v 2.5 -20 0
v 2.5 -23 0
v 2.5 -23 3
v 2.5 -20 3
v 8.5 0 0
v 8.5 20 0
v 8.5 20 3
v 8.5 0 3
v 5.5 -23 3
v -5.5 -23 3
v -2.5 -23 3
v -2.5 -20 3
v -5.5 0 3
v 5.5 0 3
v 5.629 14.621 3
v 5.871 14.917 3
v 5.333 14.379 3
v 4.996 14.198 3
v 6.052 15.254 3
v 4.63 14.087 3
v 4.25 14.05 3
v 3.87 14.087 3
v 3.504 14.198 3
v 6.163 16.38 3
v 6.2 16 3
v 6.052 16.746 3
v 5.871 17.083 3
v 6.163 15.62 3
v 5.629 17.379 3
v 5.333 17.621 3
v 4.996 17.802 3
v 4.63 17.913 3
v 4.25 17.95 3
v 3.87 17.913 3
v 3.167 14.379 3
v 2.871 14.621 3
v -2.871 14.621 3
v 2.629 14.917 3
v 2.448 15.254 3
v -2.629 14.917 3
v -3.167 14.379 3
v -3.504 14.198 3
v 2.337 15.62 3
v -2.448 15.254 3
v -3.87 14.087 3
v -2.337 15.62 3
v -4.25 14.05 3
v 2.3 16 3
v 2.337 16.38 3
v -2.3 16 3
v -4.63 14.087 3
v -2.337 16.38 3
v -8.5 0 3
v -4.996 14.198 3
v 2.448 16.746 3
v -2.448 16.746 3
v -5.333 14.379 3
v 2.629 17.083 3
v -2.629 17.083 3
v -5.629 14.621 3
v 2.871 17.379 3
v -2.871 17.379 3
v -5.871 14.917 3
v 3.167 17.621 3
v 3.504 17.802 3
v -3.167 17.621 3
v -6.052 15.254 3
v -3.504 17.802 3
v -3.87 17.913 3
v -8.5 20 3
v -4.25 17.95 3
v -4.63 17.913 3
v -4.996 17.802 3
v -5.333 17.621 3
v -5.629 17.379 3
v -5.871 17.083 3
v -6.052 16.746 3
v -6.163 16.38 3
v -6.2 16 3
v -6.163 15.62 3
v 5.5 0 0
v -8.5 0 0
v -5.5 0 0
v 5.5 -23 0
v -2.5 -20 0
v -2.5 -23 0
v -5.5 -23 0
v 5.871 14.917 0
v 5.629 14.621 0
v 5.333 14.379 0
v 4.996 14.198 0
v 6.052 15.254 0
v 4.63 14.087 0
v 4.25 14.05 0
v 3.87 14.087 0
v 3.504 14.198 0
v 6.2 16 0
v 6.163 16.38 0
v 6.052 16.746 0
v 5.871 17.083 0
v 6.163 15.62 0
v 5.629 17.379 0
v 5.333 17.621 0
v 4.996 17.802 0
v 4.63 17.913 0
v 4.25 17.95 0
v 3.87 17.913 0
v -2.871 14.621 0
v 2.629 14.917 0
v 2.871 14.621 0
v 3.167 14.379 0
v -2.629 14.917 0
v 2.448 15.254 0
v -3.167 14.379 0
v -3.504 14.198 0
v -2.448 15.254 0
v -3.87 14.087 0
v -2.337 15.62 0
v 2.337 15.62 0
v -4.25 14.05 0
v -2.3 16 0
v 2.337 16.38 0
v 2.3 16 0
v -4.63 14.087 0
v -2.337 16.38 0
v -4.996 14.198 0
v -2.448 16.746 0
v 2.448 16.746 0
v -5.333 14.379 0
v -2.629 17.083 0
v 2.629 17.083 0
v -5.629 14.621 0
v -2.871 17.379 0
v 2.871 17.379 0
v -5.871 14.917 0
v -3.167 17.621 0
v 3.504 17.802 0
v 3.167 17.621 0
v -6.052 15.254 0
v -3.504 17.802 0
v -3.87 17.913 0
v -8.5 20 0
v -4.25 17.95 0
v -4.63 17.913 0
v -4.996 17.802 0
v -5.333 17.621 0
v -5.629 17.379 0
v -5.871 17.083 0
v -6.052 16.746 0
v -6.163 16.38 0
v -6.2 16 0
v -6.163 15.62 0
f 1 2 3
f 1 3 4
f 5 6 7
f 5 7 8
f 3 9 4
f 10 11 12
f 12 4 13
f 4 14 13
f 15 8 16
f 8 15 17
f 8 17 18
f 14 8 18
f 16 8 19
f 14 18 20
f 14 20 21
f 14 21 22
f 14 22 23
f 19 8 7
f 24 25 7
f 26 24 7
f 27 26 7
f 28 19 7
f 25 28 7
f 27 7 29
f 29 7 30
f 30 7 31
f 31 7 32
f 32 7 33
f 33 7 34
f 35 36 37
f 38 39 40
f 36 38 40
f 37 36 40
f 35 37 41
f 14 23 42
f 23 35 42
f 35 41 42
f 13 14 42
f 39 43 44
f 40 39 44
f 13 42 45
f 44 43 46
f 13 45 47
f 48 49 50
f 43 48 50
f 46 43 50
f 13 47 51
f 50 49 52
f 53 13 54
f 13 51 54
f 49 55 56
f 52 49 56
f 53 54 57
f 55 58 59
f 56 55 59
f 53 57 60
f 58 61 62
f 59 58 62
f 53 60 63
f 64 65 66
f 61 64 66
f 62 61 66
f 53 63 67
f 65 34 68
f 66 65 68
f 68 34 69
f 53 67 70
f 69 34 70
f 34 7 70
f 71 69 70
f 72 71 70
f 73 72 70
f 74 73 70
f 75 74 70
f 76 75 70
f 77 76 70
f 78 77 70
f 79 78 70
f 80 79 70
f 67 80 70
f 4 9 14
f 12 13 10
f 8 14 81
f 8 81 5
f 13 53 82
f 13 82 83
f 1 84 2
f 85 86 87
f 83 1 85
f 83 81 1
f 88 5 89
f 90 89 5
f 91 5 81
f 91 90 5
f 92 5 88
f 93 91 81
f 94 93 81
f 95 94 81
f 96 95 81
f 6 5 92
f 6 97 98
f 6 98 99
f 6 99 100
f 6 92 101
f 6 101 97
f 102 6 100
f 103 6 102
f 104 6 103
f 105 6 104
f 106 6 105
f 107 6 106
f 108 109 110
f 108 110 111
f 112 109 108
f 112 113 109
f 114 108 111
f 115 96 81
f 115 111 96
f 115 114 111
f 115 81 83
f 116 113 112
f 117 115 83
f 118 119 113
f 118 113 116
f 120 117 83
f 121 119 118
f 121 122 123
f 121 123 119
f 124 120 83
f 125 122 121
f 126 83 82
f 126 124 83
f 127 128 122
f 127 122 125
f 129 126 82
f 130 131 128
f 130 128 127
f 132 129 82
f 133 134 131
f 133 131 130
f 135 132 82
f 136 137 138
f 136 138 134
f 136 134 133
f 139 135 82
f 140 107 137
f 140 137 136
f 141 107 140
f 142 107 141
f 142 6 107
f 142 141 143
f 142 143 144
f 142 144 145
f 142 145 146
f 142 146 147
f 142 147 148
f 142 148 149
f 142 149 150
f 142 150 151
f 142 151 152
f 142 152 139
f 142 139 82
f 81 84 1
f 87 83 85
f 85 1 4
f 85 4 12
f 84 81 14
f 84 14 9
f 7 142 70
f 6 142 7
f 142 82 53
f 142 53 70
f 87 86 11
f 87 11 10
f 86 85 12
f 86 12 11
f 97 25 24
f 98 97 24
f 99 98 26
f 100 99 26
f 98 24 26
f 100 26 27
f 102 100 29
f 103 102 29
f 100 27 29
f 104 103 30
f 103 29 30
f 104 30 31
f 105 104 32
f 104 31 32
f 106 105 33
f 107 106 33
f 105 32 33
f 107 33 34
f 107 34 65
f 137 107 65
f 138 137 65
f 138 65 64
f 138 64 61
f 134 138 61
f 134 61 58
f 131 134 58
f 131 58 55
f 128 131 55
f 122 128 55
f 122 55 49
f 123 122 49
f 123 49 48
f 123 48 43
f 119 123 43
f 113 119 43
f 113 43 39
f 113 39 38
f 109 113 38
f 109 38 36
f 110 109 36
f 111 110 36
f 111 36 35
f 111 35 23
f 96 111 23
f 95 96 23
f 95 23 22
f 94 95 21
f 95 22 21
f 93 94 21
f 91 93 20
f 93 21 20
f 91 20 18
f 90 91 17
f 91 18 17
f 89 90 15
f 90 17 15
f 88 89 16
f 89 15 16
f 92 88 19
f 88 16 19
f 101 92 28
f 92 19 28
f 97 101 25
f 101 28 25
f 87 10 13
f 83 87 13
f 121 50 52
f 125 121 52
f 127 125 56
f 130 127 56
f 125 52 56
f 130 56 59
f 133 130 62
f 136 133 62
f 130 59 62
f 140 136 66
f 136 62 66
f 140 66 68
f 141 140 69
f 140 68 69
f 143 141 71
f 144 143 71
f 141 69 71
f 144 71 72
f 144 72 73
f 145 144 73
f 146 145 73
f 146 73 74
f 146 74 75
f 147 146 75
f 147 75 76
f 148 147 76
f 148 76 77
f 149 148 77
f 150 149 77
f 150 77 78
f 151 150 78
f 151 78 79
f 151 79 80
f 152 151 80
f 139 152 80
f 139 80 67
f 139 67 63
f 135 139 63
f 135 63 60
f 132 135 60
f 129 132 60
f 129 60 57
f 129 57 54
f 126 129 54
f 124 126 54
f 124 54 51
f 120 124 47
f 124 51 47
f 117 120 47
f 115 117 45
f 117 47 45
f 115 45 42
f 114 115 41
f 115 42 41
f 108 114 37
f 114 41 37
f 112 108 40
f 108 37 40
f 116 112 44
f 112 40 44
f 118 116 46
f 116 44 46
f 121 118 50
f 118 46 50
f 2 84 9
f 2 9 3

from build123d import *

# Parameters (mm, degrees)
BOSS_EXTRUDE1_DEPTH = 3
SKETCH2_R           = 1.95
CUT_EXTRUDE1_DEPTH  = 25.703238654
SKETCH3_W           = 3
SKETCH3_H           = 4
CUT_EXTRUDE2_DEPTH  = 25.703238654
SKETCH4_W           = 3
SKETCH4_H           = 16
CUT_EXTRUDE3_DEPTH  = 10


with BuildPart() as part:
    # Sketch1 → Boss-Extrude1 (new body)
    with BuildSketch(Plane.XY):
        Polygon((8.5, -20), (5.5, -20), (5.5, -23), (2.5, -23), (2.5, -20), (-2.5, -20), (-2.5, -23), (-5.5, -23), (-5.5, -20), (-8.5, -20), (-8.5, 20), (8.5, 20), align=None)
    extrude(amount=BOSS_EXTRUDE1_DEPTH)

    # Sketch2 → Cut-Extrude1 (cut, through all)
    with BuildSketch(Plane.XY.offset(3)):
        with Locations((-4.25, 16)):
            Circle(SKETCH2_R)
        with Locations((4.25, 16)):
            Circle(SKETCH2_R)
    extrude(amount=-CUT_EXTRUDE1_DEPTH, mode=Mode.SUBTRACT)

    # Sketch3 → Cut-Extrude2 (cut, through all)
    with BuildSketch(Plane.XY.offset(3)):
        with Locations((-7, -18)):
            Rectangle(SKETCH3_W, SKETCH3_H)
        with Locations((7, -18)):
            Rectangle(SKETCH3_W, SKETCH3_H)
    extrude(amount=-CUT_EXTRUDE2_DEPTH, mode=Mode.SUBTRACT)

    # Sketch4 → Cut-Extrude3 (cut)
    with BuildSketch(Plane.XY.offset(3)):
        with Locations((-7, -8)):
            Rectangle(SKETCH4_W, SKETCH4_H)
        with Locations((7, -8)):
            Rectangle(SKETCH4_W, SKETCH4_H)
    extrude(amount=-CUT_EXTRUDE3_DEPTH, mode=Mode.SUBTRACT)


solid = part.part
